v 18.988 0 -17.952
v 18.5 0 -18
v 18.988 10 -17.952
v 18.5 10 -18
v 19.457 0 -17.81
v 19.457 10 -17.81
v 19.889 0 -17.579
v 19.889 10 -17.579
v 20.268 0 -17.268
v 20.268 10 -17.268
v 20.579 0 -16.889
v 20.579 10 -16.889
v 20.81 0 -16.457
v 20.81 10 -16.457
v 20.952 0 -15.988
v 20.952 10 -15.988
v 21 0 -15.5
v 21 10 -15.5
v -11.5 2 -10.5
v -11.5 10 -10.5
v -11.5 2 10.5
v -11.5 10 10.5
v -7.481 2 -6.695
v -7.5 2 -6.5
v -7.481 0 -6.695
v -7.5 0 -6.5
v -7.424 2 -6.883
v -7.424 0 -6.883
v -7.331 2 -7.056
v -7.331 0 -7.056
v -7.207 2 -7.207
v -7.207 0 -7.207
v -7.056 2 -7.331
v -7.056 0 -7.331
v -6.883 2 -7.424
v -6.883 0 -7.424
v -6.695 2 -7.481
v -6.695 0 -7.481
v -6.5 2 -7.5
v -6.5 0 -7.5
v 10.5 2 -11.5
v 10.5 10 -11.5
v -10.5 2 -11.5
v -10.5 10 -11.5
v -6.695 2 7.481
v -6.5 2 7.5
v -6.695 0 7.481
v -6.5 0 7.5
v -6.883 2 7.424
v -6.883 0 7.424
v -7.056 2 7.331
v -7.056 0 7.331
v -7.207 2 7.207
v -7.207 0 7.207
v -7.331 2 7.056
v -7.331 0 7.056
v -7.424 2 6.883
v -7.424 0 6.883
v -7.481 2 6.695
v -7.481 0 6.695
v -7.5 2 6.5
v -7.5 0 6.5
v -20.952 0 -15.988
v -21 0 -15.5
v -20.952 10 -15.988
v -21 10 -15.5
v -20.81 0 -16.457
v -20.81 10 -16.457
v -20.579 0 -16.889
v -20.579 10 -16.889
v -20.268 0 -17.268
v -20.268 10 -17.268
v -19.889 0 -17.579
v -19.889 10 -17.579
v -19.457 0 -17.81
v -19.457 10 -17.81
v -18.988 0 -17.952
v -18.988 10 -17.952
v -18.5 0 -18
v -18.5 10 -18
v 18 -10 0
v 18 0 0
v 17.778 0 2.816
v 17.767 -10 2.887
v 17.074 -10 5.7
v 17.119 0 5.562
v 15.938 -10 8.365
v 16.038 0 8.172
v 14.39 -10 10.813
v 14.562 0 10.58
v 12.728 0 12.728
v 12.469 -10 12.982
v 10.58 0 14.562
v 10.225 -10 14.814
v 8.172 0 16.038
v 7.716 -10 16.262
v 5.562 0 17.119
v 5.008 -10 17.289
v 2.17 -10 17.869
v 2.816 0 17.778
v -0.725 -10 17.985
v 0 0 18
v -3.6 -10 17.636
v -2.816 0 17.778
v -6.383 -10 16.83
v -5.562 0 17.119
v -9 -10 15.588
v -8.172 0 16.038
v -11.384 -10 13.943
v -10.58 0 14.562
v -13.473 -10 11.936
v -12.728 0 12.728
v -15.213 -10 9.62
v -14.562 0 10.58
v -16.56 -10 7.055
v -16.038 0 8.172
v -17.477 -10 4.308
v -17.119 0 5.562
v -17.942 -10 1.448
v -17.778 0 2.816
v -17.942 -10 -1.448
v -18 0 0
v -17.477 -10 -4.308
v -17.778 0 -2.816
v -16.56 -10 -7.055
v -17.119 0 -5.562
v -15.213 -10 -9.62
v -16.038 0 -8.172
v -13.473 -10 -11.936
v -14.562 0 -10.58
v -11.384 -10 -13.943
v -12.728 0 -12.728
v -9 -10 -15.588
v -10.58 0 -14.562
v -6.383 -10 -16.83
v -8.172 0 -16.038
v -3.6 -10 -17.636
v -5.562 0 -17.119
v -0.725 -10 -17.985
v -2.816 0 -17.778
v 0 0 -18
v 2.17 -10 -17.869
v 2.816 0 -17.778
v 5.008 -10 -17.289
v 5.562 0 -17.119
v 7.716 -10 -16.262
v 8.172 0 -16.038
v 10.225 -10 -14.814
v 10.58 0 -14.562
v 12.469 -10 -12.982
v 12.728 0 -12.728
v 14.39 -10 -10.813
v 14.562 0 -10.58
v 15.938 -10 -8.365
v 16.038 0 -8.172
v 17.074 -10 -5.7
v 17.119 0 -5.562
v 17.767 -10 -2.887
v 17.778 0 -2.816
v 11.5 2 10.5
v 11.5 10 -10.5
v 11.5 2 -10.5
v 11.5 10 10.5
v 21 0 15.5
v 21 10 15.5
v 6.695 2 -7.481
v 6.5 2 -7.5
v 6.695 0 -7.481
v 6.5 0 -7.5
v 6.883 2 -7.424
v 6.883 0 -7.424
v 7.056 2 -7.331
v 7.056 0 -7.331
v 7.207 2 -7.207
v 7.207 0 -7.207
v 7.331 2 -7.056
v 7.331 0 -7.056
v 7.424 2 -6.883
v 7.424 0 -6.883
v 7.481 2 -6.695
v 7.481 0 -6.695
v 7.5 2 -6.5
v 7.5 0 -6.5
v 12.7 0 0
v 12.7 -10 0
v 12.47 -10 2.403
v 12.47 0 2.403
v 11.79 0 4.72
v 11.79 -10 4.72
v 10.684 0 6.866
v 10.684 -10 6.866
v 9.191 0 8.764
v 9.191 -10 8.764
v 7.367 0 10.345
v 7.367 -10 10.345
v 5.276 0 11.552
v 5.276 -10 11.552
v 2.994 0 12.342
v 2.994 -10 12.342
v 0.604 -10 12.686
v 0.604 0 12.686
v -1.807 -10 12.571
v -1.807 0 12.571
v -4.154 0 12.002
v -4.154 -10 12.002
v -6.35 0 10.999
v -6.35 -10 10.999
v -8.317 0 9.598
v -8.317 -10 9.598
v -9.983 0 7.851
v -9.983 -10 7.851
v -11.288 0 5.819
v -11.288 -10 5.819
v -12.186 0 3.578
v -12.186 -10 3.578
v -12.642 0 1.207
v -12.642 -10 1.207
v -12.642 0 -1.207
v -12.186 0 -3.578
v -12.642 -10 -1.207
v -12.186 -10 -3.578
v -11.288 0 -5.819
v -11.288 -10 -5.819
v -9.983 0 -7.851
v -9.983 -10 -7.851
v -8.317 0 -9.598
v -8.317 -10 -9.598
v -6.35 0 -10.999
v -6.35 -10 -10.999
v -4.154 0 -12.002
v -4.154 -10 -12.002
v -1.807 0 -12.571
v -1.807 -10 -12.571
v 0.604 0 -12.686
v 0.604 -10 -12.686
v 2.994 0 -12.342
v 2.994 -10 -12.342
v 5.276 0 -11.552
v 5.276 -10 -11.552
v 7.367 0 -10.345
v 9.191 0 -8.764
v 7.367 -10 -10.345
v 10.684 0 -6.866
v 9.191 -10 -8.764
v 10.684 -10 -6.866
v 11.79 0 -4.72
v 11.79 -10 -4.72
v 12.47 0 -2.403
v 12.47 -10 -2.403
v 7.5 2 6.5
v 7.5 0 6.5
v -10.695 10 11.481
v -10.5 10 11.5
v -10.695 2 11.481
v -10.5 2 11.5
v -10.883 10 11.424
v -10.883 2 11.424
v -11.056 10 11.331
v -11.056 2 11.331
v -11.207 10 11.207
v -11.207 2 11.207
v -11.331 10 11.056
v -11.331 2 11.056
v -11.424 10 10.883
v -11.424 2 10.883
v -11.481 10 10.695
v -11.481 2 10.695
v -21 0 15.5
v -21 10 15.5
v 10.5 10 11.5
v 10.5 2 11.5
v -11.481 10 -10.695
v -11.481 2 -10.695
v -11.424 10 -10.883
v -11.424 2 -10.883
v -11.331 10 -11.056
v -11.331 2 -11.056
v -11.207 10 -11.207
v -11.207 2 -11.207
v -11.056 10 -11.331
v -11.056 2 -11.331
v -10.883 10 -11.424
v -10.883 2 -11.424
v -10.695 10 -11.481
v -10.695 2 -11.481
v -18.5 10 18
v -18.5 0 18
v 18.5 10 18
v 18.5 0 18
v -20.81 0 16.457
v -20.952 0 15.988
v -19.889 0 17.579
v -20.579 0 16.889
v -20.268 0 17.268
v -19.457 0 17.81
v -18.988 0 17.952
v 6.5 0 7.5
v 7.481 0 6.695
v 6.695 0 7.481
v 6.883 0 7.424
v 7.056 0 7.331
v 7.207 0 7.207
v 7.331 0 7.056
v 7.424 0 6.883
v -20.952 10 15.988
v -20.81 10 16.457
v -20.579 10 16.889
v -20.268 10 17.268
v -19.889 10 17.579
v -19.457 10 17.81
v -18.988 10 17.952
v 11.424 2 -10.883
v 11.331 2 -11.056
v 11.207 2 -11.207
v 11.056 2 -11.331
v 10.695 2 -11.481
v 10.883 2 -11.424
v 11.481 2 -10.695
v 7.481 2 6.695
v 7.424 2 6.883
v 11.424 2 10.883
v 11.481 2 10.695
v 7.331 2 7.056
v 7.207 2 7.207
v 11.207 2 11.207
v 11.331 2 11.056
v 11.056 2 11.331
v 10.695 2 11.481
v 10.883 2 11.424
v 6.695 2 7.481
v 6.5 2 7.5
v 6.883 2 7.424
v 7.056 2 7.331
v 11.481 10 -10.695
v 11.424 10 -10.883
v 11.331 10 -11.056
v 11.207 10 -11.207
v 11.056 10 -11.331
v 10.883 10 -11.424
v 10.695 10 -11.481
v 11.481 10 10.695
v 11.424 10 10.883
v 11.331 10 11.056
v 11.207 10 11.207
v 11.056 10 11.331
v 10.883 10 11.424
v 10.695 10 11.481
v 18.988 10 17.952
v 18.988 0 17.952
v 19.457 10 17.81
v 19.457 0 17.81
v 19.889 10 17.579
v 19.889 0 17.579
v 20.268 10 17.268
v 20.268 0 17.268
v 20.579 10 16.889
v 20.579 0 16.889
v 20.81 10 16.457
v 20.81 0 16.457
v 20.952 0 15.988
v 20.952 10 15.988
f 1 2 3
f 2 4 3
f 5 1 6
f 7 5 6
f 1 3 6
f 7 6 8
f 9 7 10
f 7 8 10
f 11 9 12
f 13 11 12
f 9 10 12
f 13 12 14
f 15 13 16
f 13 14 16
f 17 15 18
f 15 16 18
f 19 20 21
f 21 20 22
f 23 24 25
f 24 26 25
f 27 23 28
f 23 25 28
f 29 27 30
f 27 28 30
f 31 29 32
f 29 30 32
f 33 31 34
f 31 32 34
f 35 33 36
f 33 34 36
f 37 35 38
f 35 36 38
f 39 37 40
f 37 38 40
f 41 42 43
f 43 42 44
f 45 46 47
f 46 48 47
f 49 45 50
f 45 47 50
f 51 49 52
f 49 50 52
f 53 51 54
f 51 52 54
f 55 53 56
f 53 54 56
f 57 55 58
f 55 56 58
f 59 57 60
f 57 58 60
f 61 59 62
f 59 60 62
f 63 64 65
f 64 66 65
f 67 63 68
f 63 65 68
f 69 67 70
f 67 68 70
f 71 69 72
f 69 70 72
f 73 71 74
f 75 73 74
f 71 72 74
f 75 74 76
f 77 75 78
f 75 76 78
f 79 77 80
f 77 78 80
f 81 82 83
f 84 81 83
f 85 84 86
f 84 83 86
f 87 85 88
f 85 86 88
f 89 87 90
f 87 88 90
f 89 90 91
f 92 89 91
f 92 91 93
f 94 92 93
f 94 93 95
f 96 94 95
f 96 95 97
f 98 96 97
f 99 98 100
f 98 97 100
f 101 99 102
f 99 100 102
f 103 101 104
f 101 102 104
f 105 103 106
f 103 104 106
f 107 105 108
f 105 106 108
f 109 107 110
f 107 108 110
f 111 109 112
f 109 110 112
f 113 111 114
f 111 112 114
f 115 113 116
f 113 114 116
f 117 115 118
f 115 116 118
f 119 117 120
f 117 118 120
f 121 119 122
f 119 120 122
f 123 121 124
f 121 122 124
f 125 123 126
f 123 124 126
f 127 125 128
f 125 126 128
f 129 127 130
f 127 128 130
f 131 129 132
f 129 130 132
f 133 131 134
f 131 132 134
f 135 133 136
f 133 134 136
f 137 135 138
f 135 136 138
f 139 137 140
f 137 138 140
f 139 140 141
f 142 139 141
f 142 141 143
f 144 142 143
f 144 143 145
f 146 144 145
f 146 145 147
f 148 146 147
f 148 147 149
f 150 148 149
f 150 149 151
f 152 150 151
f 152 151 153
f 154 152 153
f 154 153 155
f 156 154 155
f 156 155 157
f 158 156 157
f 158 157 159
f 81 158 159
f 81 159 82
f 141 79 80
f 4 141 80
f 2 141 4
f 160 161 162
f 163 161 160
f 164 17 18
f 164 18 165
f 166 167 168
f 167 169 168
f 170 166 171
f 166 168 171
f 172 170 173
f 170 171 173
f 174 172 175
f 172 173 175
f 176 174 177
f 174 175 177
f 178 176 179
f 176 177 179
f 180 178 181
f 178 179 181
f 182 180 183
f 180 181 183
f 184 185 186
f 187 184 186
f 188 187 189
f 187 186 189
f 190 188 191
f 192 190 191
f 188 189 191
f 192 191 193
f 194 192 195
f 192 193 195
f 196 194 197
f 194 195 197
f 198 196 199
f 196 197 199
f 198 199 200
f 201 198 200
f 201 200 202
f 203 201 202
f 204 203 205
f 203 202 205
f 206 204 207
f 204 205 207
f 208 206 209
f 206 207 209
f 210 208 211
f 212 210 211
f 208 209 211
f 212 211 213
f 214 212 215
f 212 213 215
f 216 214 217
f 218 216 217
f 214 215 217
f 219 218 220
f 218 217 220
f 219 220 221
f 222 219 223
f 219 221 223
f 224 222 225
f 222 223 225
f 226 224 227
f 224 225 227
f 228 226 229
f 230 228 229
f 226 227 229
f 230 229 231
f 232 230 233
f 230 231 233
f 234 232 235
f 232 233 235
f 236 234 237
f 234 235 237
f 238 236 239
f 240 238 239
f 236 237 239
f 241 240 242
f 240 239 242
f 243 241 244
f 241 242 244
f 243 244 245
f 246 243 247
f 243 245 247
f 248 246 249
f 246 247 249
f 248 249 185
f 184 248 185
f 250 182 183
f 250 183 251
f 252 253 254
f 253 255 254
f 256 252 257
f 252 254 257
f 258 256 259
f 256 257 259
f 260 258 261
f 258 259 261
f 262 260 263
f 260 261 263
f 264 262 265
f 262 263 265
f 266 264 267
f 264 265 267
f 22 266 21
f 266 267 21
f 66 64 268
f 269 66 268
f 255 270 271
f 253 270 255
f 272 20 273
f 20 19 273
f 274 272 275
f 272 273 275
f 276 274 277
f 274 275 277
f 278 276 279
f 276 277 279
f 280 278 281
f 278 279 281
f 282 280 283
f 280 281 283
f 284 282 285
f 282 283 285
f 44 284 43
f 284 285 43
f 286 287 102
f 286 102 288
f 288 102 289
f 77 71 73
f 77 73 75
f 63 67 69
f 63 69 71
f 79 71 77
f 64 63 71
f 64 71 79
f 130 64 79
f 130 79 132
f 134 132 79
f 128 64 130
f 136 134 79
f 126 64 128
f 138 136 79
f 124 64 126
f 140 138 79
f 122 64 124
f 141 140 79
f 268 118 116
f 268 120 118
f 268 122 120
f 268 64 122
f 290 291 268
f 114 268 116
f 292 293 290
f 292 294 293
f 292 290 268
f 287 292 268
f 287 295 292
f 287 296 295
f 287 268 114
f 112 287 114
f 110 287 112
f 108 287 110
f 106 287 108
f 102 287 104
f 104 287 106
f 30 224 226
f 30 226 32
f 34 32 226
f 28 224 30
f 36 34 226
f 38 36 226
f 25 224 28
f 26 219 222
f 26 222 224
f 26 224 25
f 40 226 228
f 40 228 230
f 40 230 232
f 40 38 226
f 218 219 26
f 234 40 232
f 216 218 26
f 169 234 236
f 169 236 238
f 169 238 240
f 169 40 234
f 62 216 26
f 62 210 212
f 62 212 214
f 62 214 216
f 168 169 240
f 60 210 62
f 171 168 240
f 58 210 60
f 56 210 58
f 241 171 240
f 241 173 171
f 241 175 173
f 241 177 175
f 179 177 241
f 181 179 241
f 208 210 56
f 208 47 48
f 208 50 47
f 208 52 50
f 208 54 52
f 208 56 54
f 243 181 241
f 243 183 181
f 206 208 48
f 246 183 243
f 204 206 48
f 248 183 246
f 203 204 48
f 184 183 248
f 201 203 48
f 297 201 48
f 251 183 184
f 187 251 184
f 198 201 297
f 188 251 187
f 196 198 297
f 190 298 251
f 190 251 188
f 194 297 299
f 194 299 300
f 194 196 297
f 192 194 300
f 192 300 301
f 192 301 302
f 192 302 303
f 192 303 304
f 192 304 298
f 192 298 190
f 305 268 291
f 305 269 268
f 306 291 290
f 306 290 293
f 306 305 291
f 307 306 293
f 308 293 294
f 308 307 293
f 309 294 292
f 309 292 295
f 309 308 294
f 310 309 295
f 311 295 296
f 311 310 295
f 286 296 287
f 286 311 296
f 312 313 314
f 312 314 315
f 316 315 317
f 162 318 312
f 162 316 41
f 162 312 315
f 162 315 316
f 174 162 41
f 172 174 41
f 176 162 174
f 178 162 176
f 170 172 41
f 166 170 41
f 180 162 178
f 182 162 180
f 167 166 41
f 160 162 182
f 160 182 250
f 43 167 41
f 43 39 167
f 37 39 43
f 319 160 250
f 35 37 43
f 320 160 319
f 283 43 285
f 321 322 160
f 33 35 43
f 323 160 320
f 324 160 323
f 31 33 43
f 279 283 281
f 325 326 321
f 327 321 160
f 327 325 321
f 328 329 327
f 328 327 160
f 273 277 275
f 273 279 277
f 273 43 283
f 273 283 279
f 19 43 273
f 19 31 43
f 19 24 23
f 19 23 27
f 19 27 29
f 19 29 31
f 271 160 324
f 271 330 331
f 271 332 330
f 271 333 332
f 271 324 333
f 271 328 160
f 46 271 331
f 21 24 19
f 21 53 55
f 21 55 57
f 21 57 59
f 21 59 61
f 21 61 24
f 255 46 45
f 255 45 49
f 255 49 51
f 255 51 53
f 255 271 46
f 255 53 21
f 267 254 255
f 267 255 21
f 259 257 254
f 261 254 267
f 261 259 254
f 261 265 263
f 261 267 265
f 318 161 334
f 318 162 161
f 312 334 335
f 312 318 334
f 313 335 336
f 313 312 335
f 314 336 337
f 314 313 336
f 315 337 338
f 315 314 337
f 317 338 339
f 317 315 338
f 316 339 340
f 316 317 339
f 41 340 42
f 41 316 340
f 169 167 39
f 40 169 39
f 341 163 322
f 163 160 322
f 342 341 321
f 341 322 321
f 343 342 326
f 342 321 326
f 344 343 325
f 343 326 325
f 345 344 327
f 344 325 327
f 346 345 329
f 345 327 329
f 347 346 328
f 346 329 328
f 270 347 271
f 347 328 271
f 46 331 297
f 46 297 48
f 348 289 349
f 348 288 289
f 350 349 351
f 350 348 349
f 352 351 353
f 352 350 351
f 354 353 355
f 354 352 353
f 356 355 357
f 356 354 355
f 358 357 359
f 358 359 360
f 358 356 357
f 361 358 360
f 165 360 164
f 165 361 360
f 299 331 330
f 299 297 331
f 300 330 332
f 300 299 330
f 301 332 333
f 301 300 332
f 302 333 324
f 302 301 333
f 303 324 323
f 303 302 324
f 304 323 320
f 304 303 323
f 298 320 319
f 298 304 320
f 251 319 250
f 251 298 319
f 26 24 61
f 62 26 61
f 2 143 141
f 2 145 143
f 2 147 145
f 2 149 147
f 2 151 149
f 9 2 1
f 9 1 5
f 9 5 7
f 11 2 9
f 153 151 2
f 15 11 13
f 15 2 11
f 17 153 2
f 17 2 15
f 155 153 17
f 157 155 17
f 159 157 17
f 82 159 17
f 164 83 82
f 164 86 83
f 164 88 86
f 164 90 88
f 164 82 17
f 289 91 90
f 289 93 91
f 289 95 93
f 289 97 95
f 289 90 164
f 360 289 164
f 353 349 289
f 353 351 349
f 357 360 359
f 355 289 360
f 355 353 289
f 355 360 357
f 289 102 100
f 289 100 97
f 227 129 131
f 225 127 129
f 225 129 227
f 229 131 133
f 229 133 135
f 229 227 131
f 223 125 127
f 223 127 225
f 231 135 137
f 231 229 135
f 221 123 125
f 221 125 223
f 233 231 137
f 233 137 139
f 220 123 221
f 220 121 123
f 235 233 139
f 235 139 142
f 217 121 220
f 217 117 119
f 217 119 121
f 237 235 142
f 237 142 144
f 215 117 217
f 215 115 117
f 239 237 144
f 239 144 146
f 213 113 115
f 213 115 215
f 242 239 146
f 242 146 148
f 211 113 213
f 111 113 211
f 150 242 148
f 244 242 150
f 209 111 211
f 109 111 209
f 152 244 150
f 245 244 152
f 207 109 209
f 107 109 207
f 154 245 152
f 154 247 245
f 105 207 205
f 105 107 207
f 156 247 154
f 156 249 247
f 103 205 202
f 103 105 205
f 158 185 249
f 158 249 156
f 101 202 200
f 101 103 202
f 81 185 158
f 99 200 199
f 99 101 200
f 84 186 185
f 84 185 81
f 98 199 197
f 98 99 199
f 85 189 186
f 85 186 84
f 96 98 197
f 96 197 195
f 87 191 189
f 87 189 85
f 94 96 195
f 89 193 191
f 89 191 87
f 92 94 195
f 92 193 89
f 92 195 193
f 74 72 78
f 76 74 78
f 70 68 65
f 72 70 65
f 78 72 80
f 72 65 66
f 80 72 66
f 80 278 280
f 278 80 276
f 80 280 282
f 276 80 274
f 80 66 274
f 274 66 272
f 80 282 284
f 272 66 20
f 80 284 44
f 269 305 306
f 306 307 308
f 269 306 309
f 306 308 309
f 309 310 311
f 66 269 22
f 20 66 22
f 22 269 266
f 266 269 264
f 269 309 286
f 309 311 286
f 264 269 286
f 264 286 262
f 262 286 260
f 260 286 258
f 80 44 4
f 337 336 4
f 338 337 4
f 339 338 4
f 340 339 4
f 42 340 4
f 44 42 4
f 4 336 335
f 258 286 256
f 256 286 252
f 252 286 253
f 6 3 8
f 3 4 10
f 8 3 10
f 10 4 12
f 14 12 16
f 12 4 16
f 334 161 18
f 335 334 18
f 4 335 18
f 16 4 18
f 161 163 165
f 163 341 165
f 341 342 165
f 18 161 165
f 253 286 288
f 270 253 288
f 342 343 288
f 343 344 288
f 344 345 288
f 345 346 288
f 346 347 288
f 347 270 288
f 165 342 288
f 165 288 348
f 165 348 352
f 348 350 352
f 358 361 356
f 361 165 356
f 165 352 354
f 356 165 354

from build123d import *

# Parameters (mm, degrees)
F0_W     = 42
F0_H     = 36
F1_DEPTH = 10
F2_R     = 18
F3_DEPTH = 10
F4_R     = 12.7
F5_DEPTH = 10
F6_W     = 23
F6_H     = 23
F7_DEPTH = 8
F8_W     = 15
F8_H     = 15
F9_DEPTH = 12.001
F10_R    = 1
F11_R    = 2.5


with BuildPart() as f1:
    # F0 (on Front) → F1 (new body)
    with BuildSketch(Plane.XZ):
        Rectangle(F0_W, F0_H)
    extrude(amount=-F1_DEPTH)

    # F2 (on Front) → F3 (join)
    with BuildSketch(Plane.XZ):
        Circle(F2_R)
    extrude(amount=F3_DEPTH)

    # F4 (on face) → F5 (cut)
    with BuildSketch(Plane.XZ.offset(10)):
        Circle(F4_R)
    extrude(amount=-F5_DEPTH, mode=Mode.SUBTRACT)

    # F6 (on face) → F7 (cut)
    with BuildSketch(Plane(origin=(0, 10, 0), x_dir=(-1, 0, 0), z_dir=(0, 1, 0))):
        Rectangle(F6_W, F6_H)
    extrude(amount=-F7_DEPTH, mode=Mode.SUBTRACT)

    # F8 (on face) → F9 (cut, through all)
    with BuildSketch(Plane(origin=(0, 2, 0), x_dir=(-1, 0, 0), z_dir=(0, 1, 0))):
        Rectangle(F8_W, F8_H)
    extrude(amount=-F9_DEPTH, mode=Mode.SUBTRACT)

    # F10
    f10_edges = [f1.edges().sort_by_distance(p)[0] for p in [
        (11.5, 6, 11.5),
        (-11.5, 6, 11.5),
        (11.5, 6, -11.5),
        (-11.5, 6, -11.5),
        (-7.5, 1, -7.5),
        (7.5, 1, -7.5),
        (7.5, 1, 7.5),
        (-7.5, 1, 7.5),
    ]]
    fillet(f10_edges, radius=F10_R)

    # F11
    f11_edges = [f1.edges().sort_by_distance(p)[0] for p in [
        (-21, 5, 18),
        (-21, 5, -18),
        (21, 5, 18),
        (21, 5, -18),
    ]]
    fillet(f11_edges, radius=F11_R)


solid = f1.part
